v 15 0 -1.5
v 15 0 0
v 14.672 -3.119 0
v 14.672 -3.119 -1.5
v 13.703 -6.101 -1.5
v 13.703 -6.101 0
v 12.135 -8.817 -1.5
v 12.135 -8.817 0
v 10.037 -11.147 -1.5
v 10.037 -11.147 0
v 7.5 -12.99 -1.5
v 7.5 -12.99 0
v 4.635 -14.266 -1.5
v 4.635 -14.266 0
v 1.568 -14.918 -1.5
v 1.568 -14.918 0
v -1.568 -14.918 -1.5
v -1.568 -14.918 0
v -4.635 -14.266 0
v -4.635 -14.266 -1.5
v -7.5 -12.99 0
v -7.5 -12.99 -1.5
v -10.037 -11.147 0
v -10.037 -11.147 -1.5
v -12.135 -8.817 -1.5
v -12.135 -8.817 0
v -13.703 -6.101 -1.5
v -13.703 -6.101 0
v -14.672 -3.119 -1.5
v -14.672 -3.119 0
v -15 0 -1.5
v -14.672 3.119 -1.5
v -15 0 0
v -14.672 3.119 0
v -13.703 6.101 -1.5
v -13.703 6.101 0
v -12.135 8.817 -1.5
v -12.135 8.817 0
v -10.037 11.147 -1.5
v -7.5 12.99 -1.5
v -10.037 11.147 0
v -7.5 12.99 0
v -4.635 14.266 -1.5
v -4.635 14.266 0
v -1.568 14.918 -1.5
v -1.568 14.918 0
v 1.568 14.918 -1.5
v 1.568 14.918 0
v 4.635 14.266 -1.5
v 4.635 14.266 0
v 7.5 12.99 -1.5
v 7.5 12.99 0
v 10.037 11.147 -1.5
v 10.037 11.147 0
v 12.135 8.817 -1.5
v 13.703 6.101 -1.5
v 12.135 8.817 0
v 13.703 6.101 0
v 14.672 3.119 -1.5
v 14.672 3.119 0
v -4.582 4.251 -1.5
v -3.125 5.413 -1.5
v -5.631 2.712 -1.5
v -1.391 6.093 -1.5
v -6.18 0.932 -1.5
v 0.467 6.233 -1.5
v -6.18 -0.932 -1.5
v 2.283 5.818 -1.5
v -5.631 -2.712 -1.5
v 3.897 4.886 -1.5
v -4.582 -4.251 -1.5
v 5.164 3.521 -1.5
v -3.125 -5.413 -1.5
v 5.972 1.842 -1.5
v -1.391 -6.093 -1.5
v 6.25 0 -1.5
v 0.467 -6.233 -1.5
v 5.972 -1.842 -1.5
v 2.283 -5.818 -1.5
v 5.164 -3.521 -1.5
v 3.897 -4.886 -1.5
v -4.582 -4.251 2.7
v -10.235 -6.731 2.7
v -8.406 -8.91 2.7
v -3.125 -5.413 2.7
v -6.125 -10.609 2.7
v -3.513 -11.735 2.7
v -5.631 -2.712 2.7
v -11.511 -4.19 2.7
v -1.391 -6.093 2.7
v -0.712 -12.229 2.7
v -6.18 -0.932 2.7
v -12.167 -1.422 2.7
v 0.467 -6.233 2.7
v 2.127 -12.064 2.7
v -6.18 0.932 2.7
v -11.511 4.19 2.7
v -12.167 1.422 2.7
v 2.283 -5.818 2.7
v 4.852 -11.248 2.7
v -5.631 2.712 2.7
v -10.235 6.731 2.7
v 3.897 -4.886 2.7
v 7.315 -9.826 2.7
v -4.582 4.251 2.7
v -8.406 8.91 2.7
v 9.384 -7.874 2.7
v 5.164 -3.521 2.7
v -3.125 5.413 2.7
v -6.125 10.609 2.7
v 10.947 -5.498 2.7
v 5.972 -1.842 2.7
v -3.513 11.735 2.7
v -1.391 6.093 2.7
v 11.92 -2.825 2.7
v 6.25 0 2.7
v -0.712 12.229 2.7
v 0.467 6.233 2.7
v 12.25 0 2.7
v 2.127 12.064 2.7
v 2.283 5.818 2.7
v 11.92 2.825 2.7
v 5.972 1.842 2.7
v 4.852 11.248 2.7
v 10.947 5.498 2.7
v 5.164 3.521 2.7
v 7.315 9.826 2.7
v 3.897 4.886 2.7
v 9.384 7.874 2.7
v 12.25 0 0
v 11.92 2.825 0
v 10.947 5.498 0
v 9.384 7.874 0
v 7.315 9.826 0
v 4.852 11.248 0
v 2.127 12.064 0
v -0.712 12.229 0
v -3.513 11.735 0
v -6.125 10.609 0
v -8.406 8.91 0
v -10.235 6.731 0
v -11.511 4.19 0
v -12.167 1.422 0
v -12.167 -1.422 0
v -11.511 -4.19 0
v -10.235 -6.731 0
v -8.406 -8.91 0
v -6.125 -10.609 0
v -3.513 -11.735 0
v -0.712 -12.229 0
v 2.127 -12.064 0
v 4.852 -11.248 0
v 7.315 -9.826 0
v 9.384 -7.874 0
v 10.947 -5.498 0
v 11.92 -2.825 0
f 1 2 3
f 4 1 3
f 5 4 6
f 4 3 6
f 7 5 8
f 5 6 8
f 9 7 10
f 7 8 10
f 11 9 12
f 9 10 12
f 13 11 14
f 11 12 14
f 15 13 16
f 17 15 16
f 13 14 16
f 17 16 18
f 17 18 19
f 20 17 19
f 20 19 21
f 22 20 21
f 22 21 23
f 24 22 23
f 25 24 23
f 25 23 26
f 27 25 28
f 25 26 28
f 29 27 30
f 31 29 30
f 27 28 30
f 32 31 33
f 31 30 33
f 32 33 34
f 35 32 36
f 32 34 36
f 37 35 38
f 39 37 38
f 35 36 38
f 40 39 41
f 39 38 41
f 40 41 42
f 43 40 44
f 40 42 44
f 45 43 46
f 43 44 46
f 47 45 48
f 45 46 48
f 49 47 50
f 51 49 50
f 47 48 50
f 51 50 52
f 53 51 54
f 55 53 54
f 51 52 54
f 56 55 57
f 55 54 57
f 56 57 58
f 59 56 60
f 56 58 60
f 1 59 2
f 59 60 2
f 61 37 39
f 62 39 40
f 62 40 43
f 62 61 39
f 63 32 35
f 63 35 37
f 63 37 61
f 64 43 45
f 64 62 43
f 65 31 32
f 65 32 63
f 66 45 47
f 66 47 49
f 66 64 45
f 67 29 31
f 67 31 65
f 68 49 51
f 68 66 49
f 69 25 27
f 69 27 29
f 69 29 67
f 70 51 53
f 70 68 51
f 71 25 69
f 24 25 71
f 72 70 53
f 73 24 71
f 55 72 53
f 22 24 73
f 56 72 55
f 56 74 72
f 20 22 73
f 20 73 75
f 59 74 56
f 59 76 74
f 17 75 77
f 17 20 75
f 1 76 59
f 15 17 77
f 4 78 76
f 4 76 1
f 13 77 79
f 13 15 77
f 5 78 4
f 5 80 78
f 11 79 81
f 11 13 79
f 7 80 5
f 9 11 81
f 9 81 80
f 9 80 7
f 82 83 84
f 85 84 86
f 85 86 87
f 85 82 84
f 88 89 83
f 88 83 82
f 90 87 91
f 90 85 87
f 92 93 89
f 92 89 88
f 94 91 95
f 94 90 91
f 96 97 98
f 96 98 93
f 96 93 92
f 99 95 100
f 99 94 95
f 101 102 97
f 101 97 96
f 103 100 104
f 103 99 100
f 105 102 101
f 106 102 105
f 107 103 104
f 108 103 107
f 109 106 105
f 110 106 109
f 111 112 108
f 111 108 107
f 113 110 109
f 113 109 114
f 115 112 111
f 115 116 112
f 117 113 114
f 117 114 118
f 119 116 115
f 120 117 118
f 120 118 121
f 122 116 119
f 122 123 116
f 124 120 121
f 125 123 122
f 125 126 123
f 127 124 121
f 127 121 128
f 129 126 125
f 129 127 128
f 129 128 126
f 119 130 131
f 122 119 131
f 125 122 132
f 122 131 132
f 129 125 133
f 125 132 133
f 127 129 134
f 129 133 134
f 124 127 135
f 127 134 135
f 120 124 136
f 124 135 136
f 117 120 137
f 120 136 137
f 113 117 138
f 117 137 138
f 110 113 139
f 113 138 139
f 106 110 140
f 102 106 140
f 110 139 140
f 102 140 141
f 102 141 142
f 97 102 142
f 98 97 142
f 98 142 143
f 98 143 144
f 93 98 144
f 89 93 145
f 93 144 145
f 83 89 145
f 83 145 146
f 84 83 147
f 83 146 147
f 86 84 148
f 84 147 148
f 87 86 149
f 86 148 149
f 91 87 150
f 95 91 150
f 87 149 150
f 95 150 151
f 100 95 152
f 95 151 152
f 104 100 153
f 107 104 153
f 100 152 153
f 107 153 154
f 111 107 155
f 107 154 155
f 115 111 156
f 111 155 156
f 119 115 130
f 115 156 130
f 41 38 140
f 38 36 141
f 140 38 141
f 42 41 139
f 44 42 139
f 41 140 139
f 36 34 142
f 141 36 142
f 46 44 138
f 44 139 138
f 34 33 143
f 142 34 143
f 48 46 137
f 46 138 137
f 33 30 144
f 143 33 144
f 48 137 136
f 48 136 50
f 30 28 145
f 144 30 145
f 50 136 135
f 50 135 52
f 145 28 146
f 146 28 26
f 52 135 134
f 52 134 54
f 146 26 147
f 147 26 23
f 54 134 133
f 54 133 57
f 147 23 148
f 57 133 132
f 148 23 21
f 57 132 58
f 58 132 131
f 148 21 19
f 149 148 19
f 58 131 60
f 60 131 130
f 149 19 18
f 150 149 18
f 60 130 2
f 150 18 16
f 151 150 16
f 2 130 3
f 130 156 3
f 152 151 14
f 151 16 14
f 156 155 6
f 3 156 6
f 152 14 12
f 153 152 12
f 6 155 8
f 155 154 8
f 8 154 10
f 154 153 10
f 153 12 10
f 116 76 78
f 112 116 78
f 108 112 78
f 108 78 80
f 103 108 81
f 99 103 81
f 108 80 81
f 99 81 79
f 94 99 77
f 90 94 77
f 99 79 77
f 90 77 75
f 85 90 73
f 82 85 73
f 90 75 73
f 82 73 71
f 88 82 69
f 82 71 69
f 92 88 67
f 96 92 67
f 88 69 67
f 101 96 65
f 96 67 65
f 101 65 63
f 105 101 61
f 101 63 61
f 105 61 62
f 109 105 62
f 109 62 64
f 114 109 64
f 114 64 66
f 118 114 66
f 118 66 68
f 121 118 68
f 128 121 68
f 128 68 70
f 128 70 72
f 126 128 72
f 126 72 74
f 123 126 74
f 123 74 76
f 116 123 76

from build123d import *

# Parameters (mm, degrees)
F0_R     = 12.25
F1_DEPTH = 2.7
F2_R     = 15
F2_R_2   = 12.25
F3_DEPTH = 1.5
F4_R     = 6.25
F5_DEPTH = 10


with BuildPart() as f1:
    # F0 (on Top) → F1 (new body)
    with BuildSketch(Plane.XY):
        Circle(F0_R)
    extrude(amount=F1_DEPTH)

    # F2 (on face) → F3 (join)
    with BuildSketch(Plane(origin=(0, 0, 0), x_dir=(1, 0, 0), z_dir=(0, 0, -1))):
        Circle(F2_R)
        Circle(F2_R_2, mode=Mode.SUBTRACT)
        Circle(F2_R_2)
    extrude(amount=F3_DEPTH)

    # F4 (on face) → F5 (cut)
    with BuildSketch(Plane(origin=(0, 0, -1.5), x_dir=(1, 0, 0), z_dir=(0, 0, -1))):
        Circle(F4_R)
    extrude(amount=-F5_DEPTH, mode=Mode.SUBTRACT)


solid = f1.part
